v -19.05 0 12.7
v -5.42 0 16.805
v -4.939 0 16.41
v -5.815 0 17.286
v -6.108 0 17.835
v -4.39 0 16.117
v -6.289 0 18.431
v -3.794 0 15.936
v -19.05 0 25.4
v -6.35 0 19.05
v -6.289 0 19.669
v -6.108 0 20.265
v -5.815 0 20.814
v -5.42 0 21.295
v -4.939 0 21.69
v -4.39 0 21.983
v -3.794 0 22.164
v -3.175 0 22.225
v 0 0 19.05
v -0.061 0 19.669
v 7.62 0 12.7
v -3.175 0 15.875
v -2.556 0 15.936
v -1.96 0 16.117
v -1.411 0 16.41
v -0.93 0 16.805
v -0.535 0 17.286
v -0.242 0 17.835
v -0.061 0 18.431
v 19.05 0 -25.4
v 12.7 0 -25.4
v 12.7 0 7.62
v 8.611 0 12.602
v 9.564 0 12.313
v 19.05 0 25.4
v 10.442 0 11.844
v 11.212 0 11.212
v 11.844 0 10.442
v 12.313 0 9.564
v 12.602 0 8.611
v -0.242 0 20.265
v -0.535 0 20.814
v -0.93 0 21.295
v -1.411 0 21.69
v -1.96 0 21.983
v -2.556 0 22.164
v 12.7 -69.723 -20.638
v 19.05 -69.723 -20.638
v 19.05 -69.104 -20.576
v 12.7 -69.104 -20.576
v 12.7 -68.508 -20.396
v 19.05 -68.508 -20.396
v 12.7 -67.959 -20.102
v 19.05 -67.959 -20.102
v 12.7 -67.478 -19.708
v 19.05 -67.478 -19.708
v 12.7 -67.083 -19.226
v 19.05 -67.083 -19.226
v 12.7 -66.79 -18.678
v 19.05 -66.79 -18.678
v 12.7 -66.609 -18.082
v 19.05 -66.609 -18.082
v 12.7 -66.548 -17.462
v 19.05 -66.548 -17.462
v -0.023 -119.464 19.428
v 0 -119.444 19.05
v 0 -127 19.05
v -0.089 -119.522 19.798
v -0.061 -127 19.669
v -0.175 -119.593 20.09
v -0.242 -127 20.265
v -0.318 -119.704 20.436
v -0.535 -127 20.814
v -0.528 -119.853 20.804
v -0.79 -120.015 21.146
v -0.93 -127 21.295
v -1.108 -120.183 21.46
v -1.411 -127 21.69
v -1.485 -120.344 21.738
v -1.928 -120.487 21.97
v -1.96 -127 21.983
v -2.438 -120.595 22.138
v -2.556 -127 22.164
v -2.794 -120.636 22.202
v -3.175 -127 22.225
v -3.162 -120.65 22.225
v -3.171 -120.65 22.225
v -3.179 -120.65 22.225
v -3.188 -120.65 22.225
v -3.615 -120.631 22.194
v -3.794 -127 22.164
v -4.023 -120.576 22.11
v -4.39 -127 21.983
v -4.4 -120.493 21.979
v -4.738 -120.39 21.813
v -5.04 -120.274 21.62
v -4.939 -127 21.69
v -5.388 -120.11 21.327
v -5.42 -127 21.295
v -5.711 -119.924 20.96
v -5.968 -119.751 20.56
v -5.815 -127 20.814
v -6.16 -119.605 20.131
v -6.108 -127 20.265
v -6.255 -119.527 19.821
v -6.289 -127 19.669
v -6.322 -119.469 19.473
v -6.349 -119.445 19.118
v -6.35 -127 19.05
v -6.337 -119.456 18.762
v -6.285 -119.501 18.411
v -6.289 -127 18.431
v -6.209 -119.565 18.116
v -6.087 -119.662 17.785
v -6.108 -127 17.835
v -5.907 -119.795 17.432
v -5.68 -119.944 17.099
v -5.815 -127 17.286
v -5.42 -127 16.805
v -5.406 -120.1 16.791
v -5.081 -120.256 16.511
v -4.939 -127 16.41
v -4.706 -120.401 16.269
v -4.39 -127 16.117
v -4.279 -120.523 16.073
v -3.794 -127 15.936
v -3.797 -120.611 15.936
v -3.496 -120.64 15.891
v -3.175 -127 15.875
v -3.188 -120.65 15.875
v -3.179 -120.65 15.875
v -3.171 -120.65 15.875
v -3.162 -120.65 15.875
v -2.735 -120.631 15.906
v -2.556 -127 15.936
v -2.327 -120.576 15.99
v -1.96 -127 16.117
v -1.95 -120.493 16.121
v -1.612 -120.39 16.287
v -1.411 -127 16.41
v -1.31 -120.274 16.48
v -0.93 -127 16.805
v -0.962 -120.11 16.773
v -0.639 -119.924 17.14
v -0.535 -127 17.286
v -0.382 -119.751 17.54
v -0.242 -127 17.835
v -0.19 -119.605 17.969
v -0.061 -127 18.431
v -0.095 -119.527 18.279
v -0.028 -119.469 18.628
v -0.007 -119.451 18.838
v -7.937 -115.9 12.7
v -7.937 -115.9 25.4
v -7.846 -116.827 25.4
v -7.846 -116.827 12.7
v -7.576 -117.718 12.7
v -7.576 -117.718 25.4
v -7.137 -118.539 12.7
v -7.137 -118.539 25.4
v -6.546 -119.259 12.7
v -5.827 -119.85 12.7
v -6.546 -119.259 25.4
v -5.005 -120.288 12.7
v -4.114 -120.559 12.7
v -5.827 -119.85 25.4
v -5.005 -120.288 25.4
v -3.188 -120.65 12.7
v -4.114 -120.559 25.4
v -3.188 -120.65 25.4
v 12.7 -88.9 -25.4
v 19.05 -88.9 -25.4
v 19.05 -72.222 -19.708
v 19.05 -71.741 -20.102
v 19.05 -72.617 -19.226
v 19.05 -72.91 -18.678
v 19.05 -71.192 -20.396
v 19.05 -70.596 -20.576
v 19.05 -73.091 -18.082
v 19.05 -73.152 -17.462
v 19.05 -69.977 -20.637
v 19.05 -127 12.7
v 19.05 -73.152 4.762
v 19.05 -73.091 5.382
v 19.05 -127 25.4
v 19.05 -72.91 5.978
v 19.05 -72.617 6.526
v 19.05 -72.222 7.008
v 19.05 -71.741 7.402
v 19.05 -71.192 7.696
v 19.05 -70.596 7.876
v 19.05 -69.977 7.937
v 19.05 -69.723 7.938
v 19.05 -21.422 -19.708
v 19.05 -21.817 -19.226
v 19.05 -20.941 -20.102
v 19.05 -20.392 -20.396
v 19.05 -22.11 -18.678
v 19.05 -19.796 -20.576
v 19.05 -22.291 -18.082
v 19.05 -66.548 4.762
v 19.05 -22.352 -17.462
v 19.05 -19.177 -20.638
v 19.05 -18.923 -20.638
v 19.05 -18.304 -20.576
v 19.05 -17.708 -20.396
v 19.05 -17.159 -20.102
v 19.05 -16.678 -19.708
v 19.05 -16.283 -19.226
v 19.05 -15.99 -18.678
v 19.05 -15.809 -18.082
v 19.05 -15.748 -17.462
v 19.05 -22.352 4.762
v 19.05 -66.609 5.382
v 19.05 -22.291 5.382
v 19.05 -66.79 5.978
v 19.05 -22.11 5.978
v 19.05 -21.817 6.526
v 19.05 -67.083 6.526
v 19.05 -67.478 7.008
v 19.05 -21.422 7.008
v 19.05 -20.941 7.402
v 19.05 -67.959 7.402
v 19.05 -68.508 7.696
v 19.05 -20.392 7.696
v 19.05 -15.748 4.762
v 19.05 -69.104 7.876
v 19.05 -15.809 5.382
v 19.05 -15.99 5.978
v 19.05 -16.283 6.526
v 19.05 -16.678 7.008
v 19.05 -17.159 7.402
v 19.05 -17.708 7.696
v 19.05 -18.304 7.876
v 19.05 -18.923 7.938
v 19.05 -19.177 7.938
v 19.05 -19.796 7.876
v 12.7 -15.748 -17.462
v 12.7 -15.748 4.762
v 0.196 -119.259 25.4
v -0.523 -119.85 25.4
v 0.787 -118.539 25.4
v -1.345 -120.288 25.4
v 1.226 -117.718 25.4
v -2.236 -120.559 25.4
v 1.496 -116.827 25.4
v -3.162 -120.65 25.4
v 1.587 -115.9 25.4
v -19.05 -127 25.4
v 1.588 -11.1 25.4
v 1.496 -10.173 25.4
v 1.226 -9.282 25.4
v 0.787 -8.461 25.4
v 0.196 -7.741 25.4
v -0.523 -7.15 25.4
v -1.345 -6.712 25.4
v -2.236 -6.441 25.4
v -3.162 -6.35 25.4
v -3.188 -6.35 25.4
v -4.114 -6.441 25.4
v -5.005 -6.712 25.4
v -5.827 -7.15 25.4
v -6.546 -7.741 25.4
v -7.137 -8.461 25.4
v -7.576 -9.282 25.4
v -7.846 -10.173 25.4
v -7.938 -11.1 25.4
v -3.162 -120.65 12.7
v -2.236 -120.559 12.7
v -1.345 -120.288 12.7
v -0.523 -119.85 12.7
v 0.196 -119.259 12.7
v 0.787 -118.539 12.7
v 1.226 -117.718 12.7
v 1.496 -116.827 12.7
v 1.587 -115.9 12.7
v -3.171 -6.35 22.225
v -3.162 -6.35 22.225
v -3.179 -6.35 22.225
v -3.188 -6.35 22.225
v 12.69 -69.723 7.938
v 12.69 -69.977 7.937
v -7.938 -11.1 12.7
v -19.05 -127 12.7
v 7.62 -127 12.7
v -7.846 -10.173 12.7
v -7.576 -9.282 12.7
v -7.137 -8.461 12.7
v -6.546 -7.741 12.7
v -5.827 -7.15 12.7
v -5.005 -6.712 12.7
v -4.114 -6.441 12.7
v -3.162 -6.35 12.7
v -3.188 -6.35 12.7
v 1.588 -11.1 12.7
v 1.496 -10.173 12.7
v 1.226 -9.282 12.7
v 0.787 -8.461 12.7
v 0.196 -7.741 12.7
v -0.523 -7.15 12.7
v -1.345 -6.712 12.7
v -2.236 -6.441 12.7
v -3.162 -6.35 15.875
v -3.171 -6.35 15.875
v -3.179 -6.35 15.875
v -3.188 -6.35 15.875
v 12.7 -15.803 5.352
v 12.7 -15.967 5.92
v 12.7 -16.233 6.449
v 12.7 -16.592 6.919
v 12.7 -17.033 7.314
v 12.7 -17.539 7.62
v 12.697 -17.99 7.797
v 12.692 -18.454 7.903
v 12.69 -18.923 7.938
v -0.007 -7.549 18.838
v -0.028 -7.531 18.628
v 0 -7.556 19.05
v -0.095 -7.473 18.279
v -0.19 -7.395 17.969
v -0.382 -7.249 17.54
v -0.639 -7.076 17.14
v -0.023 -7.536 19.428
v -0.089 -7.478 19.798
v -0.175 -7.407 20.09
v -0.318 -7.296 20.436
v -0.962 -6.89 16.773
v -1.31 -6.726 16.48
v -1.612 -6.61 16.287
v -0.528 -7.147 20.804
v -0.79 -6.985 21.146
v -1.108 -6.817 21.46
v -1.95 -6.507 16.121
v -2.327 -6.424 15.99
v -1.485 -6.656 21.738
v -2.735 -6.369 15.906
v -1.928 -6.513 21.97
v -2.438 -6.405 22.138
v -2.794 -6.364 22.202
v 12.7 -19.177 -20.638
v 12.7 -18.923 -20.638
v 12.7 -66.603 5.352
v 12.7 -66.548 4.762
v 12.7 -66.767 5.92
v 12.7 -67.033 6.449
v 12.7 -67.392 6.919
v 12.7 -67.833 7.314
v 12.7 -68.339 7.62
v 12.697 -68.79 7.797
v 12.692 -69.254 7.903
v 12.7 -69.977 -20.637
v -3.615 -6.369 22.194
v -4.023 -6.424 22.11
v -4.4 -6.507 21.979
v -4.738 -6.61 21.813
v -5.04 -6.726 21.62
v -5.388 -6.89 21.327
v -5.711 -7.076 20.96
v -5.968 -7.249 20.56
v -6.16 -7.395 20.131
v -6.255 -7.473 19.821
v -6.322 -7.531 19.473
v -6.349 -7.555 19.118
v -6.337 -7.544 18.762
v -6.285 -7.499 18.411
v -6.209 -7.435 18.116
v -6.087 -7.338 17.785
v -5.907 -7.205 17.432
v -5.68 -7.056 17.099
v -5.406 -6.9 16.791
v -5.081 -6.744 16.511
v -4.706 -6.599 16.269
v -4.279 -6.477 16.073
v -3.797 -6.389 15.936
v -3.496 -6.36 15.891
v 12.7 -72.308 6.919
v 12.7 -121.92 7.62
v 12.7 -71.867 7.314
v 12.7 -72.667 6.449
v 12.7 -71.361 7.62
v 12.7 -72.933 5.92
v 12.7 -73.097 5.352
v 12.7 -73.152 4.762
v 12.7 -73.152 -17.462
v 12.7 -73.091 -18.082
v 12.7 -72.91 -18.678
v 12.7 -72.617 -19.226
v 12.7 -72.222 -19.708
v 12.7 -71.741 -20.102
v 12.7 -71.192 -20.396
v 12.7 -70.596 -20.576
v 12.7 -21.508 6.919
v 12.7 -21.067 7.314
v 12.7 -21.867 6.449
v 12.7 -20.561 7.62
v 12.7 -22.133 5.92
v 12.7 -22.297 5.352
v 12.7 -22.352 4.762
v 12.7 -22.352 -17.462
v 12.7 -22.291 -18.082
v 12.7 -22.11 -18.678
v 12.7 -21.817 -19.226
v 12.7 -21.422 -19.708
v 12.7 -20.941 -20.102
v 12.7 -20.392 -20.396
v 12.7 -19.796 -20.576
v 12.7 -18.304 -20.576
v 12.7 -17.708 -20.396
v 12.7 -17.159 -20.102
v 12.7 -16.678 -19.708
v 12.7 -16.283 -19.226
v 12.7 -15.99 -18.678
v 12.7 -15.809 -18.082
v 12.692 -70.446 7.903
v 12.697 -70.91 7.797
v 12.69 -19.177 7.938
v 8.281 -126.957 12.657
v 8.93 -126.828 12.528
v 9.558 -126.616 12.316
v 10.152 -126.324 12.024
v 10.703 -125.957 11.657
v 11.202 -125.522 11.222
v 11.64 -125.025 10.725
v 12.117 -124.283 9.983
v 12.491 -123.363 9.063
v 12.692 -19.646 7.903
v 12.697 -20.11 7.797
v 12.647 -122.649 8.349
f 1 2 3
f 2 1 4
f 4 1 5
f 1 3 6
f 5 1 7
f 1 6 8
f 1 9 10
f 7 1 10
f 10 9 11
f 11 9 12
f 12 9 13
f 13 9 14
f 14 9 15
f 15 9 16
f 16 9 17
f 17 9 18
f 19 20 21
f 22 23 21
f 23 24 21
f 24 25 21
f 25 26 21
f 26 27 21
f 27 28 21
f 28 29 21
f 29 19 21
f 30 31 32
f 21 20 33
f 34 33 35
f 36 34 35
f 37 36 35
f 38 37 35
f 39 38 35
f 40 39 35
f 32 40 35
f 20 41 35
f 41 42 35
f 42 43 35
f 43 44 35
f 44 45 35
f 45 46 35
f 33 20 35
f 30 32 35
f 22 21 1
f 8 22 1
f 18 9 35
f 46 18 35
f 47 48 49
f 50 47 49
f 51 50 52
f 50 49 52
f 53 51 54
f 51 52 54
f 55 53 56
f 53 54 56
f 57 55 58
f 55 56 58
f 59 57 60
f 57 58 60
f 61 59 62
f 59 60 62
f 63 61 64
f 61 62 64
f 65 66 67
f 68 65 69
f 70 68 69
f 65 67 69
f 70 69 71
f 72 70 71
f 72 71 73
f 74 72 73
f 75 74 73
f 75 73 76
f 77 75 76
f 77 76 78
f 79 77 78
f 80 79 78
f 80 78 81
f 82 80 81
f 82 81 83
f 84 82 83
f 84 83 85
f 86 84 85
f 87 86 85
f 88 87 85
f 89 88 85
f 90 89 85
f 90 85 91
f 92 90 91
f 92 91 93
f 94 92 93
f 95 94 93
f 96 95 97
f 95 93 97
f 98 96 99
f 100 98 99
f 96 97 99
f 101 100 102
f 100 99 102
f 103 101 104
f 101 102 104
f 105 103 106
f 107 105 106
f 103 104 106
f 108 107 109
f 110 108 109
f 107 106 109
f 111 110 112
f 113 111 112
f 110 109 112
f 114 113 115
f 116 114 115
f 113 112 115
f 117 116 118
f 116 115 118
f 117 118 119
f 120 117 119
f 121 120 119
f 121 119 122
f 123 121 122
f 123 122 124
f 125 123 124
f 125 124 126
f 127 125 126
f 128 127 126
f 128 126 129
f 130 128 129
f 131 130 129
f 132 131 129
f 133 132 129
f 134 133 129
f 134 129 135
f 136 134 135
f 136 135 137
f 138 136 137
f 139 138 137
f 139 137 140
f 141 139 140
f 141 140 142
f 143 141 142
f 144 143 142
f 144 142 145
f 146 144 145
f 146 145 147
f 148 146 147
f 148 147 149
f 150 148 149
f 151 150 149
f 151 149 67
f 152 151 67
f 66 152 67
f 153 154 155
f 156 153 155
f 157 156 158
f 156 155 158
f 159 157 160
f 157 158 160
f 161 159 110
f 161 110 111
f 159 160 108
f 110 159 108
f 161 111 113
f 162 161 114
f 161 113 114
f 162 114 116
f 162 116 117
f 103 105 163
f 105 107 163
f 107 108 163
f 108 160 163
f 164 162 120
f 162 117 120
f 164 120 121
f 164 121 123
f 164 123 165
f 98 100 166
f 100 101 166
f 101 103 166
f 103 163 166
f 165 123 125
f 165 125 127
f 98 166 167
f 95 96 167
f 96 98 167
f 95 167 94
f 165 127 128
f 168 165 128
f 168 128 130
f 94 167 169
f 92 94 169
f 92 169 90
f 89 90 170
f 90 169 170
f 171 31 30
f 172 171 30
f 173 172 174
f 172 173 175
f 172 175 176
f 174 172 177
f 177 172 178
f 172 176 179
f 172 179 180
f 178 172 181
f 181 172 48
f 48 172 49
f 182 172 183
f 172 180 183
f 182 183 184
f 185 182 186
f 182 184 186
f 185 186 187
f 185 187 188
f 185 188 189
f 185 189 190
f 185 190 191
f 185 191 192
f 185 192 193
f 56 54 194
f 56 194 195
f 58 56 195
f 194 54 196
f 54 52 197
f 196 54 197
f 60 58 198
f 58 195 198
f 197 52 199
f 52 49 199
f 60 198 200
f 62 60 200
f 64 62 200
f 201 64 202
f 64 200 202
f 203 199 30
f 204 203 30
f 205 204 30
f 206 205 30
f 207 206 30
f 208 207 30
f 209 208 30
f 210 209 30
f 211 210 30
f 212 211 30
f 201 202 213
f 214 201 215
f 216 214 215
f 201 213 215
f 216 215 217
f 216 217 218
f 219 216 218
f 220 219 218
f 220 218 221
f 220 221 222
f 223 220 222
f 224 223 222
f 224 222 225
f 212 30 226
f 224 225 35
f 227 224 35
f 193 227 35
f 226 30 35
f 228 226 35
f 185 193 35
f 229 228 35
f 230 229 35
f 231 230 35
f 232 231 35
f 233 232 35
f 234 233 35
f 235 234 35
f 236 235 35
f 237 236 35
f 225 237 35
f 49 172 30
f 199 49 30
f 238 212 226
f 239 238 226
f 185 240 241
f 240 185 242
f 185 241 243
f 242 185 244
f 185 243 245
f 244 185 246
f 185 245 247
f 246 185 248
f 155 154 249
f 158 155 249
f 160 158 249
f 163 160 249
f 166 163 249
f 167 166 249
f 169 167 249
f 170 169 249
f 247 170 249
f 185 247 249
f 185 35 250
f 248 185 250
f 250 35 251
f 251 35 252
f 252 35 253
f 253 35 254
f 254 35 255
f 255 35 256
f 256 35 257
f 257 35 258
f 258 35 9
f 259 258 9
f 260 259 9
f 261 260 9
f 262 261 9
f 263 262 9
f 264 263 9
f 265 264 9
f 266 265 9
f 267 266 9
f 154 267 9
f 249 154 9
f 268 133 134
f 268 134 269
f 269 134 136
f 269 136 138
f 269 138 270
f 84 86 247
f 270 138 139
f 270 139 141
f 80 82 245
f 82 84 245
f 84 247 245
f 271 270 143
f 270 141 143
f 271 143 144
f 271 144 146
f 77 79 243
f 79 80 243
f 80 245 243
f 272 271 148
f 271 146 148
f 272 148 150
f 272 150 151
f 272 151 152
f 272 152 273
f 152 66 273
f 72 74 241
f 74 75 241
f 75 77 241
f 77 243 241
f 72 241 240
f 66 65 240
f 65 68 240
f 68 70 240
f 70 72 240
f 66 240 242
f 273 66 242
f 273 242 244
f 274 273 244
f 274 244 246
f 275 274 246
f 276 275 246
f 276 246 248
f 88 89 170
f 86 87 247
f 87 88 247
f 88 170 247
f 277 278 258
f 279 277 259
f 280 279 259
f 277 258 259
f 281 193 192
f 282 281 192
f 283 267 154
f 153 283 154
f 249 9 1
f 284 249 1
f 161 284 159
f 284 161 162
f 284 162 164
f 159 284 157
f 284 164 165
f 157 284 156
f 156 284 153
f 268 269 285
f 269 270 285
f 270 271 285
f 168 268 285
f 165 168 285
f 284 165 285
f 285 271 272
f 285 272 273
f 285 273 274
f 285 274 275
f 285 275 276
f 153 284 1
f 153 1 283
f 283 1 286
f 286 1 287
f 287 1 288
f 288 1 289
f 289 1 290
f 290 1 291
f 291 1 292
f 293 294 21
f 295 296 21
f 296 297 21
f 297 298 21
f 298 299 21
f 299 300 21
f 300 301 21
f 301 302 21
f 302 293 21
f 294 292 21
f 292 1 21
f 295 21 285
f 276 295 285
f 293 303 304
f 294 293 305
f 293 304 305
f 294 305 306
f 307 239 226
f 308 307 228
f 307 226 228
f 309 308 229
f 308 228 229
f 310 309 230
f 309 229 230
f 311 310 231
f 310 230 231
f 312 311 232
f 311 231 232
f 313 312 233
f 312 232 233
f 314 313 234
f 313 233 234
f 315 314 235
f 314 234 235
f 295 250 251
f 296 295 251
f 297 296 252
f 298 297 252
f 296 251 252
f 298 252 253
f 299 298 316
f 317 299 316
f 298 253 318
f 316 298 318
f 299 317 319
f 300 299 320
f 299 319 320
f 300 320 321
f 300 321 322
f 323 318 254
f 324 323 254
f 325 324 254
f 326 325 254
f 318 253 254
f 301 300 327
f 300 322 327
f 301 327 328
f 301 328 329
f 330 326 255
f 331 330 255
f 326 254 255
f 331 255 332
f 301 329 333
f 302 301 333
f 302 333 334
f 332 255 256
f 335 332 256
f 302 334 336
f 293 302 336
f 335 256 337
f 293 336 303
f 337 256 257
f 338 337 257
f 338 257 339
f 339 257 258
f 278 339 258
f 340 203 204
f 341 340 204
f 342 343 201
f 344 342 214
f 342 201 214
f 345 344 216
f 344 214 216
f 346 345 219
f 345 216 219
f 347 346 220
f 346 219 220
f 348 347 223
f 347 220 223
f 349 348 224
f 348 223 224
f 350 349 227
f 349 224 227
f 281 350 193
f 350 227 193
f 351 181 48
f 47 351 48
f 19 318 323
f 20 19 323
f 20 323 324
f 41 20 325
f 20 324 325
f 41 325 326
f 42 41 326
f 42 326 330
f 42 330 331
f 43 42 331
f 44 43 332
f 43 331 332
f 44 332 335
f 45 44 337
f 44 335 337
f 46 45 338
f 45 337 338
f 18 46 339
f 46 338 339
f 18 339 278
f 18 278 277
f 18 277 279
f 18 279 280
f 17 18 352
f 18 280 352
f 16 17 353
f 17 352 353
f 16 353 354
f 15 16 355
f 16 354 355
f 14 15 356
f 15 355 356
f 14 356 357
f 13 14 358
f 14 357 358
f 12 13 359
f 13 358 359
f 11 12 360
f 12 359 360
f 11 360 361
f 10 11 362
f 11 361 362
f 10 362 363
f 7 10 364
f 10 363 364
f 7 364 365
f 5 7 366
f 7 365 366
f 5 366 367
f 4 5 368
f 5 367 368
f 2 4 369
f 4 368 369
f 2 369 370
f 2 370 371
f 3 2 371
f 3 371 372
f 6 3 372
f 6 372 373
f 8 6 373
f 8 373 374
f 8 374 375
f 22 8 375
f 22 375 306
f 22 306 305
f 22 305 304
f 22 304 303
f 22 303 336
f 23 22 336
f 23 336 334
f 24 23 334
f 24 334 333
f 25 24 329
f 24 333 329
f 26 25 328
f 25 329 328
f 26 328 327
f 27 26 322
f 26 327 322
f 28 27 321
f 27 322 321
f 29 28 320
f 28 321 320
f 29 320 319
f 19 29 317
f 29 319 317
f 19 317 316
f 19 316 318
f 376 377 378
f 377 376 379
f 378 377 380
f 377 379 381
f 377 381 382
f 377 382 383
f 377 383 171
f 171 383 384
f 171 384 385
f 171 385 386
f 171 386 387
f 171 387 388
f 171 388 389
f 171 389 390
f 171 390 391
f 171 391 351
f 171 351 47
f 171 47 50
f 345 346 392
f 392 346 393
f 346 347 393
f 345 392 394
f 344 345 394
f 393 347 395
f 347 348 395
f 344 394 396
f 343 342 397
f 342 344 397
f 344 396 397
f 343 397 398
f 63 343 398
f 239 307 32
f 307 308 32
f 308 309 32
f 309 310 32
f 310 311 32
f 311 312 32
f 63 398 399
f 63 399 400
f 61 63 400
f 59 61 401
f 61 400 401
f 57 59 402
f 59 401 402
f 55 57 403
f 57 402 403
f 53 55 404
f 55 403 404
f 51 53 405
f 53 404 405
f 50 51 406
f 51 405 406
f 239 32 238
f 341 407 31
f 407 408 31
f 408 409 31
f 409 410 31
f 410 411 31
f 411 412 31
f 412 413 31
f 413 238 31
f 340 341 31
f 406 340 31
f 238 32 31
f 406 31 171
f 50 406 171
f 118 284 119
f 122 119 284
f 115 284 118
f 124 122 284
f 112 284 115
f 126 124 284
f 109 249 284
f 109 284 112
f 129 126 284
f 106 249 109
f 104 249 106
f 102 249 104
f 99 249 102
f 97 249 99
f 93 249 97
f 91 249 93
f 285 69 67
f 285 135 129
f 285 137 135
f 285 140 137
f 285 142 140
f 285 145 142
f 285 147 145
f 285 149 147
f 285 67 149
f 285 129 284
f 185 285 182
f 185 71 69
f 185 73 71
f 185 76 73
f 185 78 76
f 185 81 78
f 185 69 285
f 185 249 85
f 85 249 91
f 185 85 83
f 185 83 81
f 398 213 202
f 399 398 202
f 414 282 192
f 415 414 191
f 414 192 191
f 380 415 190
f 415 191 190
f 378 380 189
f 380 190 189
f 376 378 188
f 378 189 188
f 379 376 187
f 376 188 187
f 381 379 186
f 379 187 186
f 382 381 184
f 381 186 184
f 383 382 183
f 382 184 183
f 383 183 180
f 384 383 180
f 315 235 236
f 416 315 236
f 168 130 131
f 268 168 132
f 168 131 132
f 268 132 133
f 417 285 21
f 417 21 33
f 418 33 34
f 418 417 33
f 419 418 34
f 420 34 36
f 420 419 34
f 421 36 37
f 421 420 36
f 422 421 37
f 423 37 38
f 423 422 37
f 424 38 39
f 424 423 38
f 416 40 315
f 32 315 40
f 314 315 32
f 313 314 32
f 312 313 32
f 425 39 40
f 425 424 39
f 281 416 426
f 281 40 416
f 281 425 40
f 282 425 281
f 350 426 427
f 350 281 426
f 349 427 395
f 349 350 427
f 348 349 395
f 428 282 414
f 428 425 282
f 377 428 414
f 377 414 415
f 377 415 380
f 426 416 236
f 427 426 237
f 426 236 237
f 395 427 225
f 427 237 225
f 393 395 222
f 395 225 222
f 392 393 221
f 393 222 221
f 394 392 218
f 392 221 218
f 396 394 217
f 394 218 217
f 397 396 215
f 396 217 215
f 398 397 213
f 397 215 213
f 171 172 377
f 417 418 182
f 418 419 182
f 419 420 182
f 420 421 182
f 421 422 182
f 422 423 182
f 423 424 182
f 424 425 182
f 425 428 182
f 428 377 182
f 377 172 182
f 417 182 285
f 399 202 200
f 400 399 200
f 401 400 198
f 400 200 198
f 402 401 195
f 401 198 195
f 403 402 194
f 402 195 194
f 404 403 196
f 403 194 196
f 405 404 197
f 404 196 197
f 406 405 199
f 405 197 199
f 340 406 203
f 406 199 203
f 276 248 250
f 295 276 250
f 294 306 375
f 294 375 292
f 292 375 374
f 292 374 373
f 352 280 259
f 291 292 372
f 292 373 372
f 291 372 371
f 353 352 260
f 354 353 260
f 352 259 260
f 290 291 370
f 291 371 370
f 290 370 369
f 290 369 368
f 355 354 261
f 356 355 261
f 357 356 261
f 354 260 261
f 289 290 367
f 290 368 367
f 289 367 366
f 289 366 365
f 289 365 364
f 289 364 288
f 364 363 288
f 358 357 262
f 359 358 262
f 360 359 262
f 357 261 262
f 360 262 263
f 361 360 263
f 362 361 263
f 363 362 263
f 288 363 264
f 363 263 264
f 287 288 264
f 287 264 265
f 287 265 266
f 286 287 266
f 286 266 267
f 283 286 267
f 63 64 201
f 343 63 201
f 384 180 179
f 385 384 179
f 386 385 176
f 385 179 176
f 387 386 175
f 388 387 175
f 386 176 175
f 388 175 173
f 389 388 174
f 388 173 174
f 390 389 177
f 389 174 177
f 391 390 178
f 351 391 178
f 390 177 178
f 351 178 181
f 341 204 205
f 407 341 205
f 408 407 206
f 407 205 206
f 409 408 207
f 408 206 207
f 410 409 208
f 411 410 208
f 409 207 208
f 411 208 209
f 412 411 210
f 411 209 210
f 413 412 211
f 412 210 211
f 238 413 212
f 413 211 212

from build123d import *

# Parameters (mm, degrees)
F1_DEPTH  = 127
F2_R      = 5.08
F4_DEPTH  = 50.801
F5_R      = 3.175
F6_DEPTH  = 127.001
F8_DEPTH  = 38.101
F10_DEPTH = 38.101


with BuildPart() as f1:
    # F0 (on Front) → F1 (new body)
    with BuildSketch(Plane.XZ):
        Polygon((19.05, -25.4), (19.05, 25.4), (-19.05, 25.4), (-19.05, 12.7), (12.7, 12.7), (12.7, -25.4), align=None)
    extrude(amount=F1_DEPTH)

    # F2
    f2_edges = [f1.edges().sort_by_distance(p)[0] for p in [
        (12.7, -63.5, 12.7),
    ]]
    fillet(f2_edges, radius=F2_R)

    # F3 (on face) → F4 (cut, through all)
    with BuildSketch(Plane.XY.offset(25.4)):
        with BuildLine():
            Line((-3.1623, -6.35), (-3.1877, -6.35))
            ThreePointArc((-3.1877, -6.35), (-6.546316, -7.741184), (-7.9375, -11.0998))
            Line((-7.9375, -11.0998), (-7.9375, -115.9002))
            ThreePointArc((-7.9375, -115.9002), (-6.546316, -119.258816), (-3.1877, -120.65))
            Line((-3.1877, -120.65), (-3.1623, -120.65))
            ThreePointArc((-3.1623, -120.65), (0.196316, -119.258816), (1.5875, -115.9002))
            Line((1.5875, -115.9002), (1.5875, -11.0998))
            ThreePointArc((1.5875, -11.0998), (0.196316, -7.741184), (-3.1623, -6.35))
        make_face()
    extrude(amount=-F4_DEPTH, mode=Mode.SUBTRACT)

    # F5 (on face) → F6 (cut, through all)
    with BuildSketch(Plane.XZ.offset(127)):
        with Locations((-3.175, 19.05)):
            Circle(F5_R)
    extrude(amount=-F6_DEPTH, mode=Mode.SUBTRACT)

    # F7 (on face) → F8 (cut, through all)
    with BuildSketch(Plane.YZ.offset(19.05)):
        Polygon((-127, 12.7), (-127, -25.4), (-88.9, -25.4), align=None)
    extrude(amount=-F8_DEPTH, mode=Mode.SUBTRACT)

    # F9 (on face) → F10 (cut, through all)
    with BuildSketch(Plane.YZ.offset(19.05)):
        with BuildLine():
            ThreePointArc((-66.548, 4.7625), (-67.477936, 7.007564), (-69.723, 7.9375))
            Line((-69.723, 7.9375), (-69.977, 7.9375))
            ThreePointArc((-69.977, 7.9375), (-72.222064, 7.007564), (-73.152, 4.7625))
            Line((-73.152, 4.7625), (-73.152, -17.4625))
            ThreePointArc((-73.152, -17.4625), (-72.222064, -19.707564), (-69.977, -20.6375))
            Line((-69.977, -20.6375), (-69.723, -20.6375))
            ThreePointArc((-69.723, -20.6375), (-67.477936, -19.707564), (-66.548, -17.4625))
            Line((-66.548, -17.4625), (-66.548, 4.7625))
        make_face()
        with BuildLine():
            ThreePointArc((-15.748, 4.7625), (-16.677936, 7.007564), (-18.923, 7.9375))
            Line((-18.923, 7.9375), (-19.177, 7.9375))
            ThreePointArc((-19.177, 7.9375), (-21.422064, 7.007564), (-22.352, 4.7625))
            Line((-22.352, 4.7625), (-22.352, -17.4625))
            ThreePointArc((-22.352, -17.4625), (-21.422064, -19.707564), (-19.177, -20.6375))
            Line((-19.177, -20.6375), (-18.923, -20.6375))
            ThreePointArc((-18.923, -20.6375), (-16.677936, -19.707564), (-15.748, -17.4625))
            Line((-15.748, -17.4625), (-15.748, 4.7625))
        make_face()
    extrude(amount=-F10_DEPTH, mode=Mode.SUBTRACT)


solid = f1.part
